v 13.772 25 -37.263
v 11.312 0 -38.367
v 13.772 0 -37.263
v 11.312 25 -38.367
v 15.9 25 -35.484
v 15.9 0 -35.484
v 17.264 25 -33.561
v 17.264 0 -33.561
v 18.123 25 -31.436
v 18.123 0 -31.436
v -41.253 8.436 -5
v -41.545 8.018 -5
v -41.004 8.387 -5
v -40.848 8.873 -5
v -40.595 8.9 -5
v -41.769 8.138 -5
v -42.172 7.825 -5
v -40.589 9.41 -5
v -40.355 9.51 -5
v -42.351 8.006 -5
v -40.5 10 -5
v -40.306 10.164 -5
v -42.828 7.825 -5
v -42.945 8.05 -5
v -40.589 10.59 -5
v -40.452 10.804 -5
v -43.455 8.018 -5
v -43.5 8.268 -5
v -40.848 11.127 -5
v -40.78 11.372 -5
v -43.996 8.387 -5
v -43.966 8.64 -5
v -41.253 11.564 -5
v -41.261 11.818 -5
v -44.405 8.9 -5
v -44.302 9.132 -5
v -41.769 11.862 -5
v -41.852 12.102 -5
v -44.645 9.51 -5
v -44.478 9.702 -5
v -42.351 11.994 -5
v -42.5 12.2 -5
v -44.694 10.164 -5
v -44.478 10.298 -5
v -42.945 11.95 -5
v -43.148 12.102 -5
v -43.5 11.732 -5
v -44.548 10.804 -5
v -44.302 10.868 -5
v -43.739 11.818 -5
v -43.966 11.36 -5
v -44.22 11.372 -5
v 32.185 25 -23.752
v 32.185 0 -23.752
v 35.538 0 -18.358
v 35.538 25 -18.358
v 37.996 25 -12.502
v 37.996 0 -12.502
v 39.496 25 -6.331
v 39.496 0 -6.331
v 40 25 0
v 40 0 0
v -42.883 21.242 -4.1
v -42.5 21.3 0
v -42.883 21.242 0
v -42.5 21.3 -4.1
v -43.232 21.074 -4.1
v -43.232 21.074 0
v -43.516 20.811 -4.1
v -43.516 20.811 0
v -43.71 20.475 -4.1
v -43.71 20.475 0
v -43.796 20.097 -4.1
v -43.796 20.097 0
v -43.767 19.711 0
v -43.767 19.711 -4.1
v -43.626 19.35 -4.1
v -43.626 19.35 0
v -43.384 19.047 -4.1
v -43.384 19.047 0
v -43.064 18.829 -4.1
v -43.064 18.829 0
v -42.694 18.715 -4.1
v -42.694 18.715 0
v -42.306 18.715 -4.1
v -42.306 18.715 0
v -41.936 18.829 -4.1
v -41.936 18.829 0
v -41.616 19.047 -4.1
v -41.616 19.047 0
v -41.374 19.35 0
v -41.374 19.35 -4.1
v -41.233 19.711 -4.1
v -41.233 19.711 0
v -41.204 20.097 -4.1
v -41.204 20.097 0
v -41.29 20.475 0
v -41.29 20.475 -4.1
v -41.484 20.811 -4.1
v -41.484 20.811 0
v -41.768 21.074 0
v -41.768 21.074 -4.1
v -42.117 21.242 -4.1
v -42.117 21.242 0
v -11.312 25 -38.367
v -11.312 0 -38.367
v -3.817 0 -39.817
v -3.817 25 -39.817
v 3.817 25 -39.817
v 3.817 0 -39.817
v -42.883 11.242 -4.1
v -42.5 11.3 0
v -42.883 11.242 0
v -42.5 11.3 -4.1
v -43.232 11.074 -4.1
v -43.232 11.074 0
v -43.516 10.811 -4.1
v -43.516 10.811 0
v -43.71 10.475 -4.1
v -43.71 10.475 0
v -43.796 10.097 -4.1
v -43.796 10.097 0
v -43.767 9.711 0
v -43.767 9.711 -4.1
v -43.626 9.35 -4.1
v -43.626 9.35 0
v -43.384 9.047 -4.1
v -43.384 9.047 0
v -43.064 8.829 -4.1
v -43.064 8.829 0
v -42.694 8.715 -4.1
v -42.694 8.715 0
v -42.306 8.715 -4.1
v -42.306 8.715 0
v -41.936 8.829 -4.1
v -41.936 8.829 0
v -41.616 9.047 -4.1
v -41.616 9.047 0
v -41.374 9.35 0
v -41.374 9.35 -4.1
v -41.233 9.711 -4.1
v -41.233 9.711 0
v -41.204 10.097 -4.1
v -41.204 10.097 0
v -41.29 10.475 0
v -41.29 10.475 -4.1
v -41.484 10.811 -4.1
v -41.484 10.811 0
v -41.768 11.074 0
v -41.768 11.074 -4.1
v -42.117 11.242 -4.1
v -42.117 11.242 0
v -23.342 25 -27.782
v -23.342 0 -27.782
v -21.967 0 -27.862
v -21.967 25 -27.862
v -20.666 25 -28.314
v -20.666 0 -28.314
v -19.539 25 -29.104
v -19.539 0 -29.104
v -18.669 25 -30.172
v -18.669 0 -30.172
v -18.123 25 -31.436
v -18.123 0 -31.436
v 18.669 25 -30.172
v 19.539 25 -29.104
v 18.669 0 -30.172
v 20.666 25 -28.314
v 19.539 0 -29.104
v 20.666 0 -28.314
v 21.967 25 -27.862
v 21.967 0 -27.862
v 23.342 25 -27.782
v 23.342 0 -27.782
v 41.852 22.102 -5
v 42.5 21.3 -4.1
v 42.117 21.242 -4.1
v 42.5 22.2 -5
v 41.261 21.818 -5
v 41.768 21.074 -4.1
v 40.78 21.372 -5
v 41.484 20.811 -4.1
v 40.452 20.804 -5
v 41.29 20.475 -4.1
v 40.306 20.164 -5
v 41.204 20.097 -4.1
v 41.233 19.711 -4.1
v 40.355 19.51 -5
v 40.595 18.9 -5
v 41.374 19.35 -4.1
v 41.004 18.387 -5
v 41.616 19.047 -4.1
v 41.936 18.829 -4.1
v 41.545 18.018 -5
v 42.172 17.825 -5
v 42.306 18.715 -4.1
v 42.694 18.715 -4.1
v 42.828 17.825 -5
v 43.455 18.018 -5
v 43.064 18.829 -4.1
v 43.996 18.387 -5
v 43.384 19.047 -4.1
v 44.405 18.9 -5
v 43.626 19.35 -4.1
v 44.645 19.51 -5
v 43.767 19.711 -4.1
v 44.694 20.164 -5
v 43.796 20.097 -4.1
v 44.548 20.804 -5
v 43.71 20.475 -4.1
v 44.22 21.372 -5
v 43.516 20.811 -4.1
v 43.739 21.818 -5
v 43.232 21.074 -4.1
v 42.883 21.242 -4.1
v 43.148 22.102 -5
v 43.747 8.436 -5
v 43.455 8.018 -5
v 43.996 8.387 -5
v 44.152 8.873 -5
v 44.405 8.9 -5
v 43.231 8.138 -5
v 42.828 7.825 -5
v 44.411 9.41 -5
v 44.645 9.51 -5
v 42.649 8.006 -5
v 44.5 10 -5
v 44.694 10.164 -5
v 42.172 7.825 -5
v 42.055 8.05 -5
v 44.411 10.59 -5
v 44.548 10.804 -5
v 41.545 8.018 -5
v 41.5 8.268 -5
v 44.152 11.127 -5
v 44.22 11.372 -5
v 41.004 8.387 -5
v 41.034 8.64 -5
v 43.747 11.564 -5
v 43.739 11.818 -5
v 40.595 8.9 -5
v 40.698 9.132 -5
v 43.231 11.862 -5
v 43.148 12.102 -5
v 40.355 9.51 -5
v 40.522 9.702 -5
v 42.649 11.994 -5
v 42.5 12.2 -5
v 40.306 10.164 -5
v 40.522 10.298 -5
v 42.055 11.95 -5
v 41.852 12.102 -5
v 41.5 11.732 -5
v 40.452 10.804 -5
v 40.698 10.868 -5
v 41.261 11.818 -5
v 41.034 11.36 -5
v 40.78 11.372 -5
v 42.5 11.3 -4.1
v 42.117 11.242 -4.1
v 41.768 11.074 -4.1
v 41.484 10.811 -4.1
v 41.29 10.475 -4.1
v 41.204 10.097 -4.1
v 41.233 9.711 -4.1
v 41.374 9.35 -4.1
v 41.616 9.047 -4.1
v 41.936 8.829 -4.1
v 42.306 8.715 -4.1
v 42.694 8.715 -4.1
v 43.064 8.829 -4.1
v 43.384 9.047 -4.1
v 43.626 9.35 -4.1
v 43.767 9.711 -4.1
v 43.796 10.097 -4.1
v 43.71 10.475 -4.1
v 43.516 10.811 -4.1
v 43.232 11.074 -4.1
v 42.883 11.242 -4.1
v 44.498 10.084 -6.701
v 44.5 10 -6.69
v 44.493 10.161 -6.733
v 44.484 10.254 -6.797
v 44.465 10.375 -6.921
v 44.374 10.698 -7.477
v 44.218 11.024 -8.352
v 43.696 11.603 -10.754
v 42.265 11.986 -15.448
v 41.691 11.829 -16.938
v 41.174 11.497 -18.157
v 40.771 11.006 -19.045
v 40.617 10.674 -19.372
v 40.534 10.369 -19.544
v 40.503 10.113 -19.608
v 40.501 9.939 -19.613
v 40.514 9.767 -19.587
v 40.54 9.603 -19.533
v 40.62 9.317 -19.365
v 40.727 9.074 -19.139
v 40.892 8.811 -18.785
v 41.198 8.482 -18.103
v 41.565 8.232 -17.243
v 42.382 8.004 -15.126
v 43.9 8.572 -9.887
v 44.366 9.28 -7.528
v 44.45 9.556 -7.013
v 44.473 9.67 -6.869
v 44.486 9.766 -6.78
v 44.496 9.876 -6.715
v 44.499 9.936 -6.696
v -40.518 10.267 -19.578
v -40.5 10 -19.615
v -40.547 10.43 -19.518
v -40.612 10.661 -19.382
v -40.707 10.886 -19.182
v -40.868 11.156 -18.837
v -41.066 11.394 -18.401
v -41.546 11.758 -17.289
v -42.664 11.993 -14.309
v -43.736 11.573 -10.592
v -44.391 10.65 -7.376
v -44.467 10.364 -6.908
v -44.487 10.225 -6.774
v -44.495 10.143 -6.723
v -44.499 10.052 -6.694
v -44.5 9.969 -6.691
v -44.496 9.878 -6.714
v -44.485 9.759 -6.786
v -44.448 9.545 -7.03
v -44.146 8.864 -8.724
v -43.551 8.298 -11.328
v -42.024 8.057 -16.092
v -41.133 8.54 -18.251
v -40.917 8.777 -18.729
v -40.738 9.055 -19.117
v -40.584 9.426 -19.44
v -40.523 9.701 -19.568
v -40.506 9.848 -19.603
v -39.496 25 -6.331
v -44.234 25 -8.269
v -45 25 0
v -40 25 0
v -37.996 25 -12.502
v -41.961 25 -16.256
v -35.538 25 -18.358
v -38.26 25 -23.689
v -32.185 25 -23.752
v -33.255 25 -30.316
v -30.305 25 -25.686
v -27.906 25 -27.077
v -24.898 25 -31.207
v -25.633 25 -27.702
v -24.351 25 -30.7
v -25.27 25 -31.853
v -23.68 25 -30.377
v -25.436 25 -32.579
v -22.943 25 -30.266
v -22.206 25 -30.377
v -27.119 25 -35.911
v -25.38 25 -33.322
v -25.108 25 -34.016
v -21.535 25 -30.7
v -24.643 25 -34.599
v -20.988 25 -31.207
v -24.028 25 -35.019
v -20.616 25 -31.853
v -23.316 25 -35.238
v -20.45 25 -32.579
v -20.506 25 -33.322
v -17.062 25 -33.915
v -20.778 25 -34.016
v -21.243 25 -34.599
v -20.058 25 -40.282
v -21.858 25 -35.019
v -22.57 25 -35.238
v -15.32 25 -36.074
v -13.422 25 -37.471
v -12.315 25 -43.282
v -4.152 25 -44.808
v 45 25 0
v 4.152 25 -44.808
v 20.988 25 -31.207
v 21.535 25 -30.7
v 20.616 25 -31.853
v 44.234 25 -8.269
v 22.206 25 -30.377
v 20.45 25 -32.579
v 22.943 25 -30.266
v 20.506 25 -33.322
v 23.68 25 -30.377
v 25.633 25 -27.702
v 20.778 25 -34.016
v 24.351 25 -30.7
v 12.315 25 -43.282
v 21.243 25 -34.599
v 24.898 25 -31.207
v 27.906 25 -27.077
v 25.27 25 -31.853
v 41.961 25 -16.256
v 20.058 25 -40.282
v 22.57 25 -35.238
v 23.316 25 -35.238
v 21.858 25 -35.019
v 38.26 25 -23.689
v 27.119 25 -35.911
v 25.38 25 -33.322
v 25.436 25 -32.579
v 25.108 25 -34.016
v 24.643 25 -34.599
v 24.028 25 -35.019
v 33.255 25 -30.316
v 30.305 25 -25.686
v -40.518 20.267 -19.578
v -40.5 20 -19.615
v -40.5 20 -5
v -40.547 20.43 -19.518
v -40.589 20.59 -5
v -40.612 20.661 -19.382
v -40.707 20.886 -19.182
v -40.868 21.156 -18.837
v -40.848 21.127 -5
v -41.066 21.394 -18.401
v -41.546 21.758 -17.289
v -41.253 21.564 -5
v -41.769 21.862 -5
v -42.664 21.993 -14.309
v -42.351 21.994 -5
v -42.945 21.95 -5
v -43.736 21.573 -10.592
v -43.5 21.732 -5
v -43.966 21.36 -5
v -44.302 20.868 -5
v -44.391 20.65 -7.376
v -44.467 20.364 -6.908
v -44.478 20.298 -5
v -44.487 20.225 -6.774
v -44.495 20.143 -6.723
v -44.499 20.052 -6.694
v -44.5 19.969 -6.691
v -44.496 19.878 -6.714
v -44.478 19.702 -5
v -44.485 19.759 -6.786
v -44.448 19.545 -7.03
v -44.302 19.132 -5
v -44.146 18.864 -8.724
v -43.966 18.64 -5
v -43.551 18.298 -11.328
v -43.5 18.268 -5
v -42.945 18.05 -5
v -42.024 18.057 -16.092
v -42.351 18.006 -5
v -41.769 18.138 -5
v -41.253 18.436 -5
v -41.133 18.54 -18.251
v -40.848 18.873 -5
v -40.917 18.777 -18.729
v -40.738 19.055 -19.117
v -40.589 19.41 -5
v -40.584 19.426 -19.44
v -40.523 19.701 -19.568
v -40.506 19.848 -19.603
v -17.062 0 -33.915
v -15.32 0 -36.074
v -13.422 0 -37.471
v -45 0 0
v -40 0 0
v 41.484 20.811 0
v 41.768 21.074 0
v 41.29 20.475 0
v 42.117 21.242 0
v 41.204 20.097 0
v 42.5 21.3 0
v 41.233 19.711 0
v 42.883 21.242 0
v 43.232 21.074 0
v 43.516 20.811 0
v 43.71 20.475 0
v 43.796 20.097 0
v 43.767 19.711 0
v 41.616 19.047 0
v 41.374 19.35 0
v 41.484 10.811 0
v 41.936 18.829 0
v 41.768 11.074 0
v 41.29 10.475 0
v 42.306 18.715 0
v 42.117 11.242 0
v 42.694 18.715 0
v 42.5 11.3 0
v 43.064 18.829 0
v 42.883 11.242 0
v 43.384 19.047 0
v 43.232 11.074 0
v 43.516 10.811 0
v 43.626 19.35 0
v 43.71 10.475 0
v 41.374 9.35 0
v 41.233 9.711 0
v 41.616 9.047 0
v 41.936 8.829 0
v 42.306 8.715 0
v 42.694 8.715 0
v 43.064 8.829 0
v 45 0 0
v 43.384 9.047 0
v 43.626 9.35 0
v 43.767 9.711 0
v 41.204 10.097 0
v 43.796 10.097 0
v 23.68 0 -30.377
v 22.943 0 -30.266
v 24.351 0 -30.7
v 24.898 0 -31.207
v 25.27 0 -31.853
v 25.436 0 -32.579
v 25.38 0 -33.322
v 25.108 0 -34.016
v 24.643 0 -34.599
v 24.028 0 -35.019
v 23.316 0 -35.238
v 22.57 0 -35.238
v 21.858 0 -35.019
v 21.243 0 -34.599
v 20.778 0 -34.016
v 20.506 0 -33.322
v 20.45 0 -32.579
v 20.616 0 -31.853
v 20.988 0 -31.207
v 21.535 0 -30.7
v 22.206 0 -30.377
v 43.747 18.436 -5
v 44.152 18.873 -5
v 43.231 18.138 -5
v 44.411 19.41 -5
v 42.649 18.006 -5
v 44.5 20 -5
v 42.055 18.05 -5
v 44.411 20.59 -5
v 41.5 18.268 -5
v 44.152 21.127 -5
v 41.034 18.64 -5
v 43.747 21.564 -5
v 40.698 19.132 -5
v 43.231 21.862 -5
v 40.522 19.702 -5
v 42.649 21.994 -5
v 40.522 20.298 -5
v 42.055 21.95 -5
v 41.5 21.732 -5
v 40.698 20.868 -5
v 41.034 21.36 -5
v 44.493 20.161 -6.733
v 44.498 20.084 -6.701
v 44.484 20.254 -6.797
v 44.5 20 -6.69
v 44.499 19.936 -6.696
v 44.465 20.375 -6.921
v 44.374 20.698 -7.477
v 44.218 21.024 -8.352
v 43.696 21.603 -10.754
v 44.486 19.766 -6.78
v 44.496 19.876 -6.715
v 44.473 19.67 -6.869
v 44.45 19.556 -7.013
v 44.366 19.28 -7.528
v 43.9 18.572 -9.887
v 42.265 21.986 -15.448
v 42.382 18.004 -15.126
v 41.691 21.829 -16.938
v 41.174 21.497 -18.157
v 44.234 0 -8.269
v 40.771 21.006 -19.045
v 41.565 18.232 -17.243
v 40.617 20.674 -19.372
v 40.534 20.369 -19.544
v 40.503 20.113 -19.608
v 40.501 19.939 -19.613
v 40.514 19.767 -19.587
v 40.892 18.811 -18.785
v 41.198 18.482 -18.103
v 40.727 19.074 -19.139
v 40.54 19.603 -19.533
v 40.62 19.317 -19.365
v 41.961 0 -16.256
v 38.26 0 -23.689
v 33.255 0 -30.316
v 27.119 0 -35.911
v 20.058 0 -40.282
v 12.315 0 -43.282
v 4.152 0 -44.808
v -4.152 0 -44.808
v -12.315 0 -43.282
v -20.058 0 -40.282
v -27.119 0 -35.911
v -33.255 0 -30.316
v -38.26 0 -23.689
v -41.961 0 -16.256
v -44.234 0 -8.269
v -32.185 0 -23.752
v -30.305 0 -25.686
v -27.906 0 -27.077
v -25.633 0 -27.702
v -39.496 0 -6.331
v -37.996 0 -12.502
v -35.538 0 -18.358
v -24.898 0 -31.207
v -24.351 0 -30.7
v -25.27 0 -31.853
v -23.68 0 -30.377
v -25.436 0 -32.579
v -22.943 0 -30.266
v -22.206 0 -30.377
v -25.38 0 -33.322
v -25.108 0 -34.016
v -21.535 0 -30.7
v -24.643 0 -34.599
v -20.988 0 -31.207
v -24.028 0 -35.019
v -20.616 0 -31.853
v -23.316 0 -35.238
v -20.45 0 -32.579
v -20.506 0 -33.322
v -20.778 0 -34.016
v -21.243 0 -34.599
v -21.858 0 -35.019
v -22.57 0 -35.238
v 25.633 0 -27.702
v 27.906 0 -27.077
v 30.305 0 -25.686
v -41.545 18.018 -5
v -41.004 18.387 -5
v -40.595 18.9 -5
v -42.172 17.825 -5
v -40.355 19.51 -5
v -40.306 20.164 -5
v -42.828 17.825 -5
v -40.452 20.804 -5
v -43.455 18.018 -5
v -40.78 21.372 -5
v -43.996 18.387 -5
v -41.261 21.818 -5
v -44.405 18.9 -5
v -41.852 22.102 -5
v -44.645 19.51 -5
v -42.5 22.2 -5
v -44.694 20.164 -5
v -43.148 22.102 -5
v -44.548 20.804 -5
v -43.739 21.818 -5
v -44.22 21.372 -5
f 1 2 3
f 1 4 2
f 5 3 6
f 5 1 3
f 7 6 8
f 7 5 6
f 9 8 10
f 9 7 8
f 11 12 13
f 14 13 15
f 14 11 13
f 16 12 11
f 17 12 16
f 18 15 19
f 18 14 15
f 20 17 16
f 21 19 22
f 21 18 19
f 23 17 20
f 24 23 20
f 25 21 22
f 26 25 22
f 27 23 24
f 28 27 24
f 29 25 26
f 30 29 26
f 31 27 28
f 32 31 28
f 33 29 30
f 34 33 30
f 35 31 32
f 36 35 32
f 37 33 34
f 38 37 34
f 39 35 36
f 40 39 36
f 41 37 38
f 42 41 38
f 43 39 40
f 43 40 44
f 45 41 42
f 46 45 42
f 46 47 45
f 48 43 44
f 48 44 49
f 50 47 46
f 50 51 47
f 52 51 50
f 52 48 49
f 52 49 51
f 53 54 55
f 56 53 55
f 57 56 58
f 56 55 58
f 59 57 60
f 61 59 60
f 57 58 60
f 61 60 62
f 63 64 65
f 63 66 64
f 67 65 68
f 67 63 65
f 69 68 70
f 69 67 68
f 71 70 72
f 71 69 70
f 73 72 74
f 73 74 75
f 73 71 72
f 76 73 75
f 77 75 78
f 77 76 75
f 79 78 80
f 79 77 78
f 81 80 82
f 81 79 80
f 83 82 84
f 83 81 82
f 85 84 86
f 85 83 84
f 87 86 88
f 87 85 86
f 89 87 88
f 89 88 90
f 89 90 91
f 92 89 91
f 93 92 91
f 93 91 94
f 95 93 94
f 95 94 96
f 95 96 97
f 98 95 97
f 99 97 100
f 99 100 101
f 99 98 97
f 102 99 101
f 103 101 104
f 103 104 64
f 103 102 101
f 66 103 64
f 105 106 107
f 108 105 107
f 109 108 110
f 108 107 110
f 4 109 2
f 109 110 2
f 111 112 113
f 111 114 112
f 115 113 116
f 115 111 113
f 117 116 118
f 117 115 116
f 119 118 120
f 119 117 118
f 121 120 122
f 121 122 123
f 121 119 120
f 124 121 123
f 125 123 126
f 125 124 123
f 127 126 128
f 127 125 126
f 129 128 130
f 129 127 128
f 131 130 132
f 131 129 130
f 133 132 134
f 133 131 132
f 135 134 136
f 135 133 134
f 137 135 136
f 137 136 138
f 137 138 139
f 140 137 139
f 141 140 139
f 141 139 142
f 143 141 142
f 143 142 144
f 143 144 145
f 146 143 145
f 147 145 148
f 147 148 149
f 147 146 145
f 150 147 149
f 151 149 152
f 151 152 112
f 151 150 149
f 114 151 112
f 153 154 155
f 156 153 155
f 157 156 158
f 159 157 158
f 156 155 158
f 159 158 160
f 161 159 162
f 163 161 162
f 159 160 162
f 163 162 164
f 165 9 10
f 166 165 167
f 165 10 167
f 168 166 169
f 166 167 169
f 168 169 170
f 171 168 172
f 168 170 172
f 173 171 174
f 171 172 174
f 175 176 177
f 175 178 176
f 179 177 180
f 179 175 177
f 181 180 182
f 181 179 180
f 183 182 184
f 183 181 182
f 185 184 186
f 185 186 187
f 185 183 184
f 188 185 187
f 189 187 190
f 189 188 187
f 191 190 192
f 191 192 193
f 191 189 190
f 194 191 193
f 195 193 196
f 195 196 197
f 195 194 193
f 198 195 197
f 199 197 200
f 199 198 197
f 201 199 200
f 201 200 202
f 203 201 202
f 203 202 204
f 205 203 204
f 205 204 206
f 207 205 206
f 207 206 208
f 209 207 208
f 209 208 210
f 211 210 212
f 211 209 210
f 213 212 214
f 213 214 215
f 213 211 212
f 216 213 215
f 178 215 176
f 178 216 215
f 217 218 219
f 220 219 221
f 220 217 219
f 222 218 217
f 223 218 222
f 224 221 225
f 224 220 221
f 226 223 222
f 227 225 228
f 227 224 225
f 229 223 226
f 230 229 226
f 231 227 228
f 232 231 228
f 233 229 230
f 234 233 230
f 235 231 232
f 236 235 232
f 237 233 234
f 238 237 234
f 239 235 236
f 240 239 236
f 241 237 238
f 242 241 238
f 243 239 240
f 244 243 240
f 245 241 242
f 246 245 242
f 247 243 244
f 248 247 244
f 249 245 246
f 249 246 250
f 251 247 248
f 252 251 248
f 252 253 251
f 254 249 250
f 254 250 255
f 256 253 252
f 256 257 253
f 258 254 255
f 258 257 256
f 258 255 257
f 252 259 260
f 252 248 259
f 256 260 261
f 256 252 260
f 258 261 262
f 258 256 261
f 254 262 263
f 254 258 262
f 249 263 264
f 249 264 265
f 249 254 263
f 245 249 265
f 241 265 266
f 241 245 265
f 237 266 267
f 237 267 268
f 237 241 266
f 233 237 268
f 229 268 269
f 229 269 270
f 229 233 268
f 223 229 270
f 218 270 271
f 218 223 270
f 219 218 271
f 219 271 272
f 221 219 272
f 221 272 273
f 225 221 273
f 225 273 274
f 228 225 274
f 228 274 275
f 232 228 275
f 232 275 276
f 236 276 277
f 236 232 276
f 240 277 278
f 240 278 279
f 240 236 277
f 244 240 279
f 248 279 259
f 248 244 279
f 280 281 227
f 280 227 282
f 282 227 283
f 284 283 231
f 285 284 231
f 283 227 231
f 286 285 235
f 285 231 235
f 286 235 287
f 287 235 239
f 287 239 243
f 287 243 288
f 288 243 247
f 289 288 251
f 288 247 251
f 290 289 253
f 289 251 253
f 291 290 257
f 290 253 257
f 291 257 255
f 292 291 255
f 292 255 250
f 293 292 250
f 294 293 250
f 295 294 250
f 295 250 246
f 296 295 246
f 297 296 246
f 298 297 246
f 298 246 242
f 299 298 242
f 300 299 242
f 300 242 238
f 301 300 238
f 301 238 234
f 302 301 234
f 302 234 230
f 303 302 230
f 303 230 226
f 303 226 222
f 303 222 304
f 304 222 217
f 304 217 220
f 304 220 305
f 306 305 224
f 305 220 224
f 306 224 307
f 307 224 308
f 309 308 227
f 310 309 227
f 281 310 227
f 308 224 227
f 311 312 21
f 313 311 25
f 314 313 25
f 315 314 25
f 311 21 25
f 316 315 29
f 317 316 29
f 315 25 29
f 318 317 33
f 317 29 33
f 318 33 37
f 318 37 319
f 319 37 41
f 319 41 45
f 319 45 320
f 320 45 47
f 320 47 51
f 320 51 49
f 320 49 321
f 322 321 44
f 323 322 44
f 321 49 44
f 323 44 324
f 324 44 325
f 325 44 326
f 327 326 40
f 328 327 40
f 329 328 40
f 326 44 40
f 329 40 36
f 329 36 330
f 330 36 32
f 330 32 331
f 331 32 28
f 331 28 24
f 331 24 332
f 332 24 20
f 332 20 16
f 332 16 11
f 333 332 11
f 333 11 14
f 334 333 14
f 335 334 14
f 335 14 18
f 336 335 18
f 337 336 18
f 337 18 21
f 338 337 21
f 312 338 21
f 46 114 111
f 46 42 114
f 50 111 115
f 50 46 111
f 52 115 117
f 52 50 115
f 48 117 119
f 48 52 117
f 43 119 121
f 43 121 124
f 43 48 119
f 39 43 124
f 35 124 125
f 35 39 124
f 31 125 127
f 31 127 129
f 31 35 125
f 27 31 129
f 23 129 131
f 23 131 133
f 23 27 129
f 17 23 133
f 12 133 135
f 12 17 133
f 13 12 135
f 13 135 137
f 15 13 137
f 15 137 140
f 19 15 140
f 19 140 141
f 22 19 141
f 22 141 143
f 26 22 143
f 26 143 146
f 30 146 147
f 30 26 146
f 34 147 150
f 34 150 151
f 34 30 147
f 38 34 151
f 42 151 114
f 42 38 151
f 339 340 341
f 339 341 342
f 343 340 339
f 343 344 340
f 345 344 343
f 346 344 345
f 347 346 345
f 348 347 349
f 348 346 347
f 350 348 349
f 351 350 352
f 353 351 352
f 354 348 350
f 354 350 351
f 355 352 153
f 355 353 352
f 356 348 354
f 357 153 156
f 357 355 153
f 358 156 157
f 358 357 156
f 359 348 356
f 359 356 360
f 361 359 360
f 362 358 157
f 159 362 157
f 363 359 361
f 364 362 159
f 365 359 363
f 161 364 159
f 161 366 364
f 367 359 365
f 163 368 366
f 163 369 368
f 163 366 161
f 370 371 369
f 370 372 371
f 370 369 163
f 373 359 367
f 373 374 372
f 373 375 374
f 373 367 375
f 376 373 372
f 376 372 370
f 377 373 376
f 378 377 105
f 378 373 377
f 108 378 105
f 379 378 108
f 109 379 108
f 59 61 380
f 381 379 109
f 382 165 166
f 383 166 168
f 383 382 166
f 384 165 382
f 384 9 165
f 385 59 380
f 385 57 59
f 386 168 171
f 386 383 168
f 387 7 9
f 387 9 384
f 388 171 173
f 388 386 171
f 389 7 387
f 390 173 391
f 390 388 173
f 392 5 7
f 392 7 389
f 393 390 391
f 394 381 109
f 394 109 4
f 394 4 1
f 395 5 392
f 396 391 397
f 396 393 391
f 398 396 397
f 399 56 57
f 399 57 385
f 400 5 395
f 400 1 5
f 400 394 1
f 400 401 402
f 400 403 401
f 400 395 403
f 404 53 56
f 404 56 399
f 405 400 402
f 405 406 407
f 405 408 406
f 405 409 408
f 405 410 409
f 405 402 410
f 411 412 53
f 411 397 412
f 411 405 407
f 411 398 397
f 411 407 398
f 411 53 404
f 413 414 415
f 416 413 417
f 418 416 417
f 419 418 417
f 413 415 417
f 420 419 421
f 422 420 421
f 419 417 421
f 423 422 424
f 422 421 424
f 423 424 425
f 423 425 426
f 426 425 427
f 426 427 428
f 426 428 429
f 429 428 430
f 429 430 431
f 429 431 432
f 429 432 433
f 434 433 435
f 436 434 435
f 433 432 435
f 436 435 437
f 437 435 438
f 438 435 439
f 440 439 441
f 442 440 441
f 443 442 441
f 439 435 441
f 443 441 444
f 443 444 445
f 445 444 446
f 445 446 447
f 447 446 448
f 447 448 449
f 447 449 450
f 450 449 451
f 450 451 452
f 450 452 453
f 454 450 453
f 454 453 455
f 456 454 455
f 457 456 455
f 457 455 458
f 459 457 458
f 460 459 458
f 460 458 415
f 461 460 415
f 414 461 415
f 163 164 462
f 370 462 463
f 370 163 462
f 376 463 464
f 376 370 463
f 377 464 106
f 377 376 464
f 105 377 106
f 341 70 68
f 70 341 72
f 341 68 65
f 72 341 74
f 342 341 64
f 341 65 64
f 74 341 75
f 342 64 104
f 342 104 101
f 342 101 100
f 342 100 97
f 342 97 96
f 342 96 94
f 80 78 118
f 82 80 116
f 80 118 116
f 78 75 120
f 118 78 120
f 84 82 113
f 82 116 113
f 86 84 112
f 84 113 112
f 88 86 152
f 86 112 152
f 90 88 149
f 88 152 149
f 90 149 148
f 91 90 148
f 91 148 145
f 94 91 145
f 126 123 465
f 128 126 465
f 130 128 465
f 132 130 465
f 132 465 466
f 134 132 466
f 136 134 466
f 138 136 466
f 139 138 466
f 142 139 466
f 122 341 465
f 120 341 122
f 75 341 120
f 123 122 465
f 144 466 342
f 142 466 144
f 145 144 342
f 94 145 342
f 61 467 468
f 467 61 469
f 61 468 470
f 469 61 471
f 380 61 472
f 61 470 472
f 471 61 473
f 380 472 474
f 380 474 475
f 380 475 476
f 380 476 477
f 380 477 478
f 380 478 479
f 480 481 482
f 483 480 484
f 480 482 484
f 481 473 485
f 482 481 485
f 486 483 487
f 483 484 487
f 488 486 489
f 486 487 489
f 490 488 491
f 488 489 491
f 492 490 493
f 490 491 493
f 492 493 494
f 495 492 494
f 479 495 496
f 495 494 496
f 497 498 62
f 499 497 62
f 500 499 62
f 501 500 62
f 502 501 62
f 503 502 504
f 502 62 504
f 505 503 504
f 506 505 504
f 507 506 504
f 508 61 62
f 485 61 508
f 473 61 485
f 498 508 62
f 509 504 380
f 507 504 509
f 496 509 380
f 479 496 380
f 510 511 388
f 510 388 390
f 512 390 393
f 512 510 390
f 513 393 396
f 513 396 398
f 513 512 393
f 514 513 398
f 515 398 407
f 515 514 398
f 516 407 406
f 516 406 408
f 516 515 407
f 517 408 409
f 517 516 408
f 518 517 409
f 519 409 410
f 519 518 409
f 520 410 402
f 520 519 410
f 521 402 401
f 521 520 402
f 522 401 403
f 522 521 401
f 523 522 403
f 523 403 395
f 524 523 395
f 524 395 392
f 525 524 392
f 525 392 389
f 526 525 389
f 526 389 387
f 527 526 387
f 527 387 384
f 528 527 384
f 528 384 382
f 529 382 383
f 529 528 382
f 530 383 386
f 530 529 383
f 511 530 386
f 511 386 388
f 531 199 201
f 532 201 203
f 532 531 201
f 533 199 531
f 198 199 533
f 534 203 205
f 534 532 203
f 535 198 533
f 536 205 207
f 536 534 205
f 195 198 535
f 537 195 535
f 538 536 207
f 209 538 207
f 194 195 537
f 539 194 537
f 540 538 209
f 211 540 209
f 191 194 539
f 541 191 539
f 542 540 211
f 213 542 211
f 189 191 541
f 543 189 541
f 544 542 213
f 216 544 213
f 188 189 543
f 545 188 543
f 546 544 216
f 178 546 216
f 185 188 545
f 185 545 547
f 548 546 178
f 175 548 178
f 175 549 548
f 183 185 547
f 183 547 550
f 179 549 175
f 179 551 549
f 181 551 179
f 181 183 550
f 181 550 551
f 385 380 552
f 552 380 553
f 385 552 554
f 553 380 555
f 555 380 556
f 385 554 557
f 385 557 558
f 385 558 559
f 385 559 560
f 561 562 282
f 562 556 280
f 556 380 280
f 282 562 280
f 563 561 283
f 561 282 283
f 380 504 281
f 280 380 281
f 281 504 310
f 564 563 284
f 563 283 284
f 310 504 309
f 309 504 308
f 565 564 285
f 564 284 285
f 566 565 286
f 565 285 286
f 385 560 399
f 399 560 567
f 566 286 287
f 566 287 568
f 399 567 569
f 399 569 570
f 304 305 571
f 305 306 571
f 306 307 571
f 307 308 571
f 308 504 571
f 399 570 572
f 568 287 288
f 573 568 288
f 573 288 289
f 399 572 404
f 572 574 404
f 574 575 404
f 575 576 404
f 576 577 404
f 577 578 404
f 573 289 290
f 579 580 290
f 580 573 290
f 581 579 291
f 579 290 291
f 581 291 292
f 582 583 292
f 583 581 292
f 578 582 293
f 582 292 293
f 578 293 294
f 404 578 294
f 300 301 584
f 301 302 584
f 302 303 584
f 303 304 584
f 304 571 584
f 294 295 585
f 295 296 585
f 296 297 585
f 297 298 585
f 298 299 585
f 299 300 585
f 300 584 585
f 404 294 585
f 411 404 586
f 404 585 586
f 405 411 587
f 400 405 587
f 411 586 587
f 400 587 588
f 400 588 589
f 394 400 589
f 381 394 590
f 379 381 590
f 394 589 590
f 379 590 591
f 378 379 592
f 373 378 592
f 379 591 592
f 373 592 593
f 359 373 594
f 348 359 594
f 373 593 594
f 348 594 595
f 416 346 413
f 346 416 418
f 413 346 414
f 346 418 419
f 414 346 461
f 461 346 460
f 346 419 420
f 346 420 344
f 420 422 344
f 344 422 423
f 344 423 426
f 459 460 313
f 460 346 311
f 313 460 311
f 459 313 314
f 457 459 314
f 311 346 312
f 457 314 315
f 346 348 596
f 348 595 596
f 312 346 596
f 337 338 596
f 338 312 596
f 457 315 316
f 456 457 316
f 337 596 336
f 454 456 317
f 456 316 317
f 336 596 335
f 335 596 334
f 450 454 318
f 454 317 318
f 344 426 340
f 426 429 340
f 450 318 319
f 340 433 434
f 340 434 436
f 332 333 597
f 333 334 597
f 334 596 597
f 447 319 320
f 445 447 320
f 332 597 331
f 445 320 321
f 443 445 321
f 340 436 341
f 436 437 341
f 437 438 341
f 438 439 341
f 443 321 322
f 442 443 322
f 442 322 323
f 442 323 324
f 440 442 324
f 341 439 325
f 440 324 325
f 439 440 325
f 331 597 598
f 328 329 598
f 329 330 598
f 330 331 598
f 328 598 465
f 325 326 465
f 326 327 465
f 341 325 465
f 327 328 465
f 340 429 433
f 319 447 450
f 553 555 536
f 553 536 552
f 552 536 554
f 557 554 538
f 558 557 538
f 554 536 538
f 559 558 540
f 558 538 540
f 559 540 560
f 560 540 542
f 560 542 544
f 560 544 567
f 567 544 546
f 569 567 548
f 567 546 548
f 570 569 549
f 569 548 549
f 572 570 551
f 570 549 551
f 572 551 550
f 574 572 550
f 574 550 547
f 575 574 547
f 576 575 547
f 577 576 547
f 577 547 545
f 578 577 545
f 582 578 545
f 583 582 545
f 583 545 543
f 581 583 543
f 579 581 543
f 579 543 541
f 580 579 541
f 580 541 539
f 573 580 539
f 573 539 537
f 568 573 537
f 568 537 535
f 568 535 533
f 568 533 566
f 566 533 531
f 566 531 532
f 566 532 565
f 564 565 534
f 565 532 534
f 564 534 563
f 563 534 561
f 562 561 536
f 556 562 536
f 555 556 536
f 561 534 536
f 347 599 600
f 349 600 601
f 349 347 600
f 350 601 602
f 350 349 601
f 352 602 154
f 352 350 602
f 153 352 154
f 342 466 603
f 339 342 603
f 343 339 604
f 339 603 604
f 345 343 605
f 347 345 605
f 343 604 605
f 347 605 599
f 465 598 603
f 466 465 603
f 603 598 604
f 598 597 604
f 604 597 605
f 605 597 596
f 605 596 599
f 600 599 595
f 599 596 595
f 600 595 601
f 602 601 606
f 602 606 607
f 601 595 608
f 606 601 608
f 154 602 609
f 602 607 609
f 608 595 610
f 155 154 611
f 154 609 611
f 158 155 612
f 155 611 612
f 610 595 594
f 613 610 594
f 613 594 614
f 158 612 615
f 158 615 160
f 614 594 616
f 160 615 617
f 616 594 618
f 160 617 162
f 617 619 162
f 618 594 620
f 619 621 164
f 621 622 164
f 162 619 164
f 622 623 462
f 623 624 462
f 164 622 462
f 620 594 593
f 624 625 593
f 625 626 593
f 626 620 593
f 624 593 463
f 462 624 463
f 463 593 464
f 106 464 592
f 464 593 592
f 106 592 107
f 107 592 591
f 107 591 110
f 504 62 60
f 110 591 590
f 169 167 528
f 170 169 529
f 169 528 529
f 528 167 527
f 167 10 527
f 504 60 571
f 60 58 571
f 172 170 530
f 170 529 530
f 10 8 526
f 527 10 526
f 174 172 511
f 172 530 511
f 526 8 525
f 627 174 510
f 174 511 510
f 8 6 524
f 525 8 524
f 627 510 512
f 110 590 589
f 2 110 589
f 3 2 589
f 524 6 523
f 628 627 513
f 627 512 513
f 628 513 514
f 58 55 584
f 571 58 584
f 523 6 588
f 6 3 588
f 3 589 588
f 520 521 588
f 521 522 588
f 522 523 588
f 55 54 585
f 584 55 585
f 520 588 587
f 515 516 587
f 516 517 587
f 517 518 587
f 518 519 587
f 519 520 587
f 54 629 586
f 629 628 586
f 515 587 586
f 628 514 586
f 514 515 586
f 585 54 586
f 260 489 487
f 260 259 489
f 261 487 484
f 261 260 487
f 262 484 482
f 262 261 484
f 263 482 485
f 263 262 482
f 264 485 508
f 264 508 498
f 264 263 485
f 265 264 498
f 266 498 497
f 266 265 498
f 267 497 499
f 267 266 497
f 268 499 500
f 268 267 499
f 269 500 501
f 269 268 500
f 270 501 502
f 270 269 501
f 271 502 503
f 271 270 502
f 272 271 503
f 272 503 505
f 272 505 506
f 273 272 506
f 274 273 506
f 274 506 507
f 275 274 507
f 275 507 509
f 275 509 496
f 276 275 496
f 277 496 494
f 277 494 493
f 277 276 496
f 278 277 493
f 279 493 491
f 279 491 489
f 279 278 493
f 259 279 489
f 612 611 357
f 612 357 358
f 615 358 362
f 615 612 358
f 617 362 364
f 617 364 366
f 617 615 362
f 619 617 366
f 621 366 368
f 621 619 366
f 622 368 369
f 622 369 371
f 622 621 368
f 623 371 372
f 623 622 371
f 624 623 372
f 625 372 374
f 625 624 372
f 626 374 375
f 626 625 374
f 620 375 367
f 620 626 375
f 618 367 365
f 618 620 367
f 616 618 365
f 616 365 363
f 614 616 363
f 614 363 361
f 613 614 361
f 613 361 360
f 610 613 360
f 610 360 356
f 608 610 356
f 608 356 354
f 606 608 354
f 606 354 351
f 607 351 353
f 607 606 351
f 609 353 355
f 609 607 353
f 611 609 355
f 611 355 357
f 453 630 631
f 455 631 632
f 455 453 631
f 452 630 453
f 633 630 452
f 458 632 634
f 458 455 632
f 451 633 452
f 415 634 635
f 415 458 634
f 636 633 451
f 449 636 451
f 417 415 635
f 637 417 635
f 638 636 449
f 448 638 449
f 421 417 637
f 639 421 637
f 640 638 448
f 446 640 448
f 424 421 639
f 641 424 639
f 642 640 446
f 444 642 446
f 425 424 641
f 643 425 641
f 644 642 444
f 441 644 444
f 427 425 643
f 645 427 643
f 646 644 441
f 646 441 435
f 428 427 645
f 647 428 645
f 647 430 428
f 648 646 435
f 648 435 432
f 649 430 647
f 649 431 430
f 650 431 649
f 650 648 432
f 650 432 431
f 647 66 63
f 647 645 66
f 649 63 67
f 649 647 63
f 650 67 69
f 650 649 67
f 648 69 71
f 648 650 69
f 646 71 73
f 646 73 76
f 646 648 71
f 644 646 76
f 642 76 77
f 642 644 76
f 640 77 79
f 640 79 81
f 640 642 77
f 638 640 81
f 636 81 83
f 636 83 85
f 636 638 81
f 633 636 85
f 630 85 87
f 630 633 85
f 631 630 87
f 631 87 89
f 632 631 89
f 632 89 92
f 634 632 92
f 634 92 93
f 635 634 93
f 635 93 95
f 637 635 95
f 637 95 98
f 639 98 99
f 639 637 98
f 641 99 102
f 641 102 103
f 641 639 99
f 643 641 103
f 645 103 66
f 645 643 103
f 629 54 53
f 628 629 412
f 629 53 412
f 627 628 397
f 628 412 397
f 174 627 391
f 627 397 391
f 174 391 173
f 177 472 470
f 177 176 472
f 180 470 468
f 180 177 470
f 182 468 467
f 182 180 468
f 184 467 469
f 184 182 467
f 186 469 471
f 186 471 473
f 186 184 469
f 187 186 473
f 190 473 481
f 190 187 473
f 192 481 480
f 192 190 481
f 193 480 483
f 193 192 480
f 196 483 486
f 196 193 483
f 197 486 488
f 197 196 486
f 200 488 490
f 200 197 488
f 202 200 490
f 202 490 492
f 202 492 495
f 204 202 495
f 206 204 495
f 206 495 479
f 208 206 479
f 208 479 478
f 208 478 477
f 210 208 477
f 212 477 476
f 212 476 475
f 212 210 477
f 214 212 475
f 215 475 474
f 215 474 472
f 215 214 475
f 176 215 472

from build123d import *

# Parameters (mm, degrees)
SKETCH1_R                                      = 2.5
BOSS_EXTRUDE1_DEPTH                            = 25
CUT_EXTRUDE3_START                             = -5
SKETCH6_R                                      = 2
CUT_EXTRUDE3_DEPTH                             = 64.373971656
SKETCH7_R                                      = 1
CUT_EXTRUDE4_DEPTH                             = 69.373971824
FILLET1_R                                      = 10
CSK_FOR_M2_FLAT_HEAD_MACHINE_SCREW1_AT_2_COUNT = 2
CSK_FOR_M2_FLAT_HEAD_MACHINE_SCREW1_AT_2_PITCH = 85.586213843
CSK_FOR_M2_FLAT_HEAD_MACHINE_SCREW2_AT_2_COUNT = 2
CSK_FOR_M2_FLAT_HEAD_MACHINE_SCREW2_AT_2_PITCH = 85.586213843


with BuildPart() as part:
    # Sketch1 → Boss-Extrude1 (new body)
    with BuildSketch(Plane(origin=(0, 0, 0), x_dir=(1, 0, 0), z_dir=(0, 1, 0))):
        with BuildLine():
            Line((-45, 0), (-40, 0))
            ThreePointArc((-40, 0), (-36.565439333, 16.216308038), (-26.85156768, 29.647821389))
            ThreePointArc((-26.85156768, 29.647821389), (-20.075175272, 28.67032155), (-18.676061955, 35.372372126))
            ThreePointArc((-18.676061955, 35.372372126), (0, 40), (18.676061955, 35.372372126))
            ThreePointArc((18.676061955, 35.372372126), (20.075175272, 28.67032155), (26.85156768, 29.647821389))
            ThreePointArc((26.85156768, 29.647821389), (36.565439333, 16.216308038), (40, 0))
            Line((40, 0), (45, 0))
            ThreePointArc((45, 0), (0, 45), (-45, 0))
        make_face()
        with Locations(Location((22.943057454, 32.766081772, 0), (0, 0, 270))):
            Circle(SKETCH1_R, mode=Mode.SUBTRACT)
        with Locations(Location((-22.943057454, 32.766081772, 0), (0, 0, 270))):
            Circle(SKETCH1_R, mode=Mode.SUBTRACT)
    extrude(amount=BOSS_EXTRUDE1_DEPTH)

    # Sketch6 → Cut-Extrude3 (cut, through all)
    with BuildSketch(Plane.XY.offset(CUT_EXTRUDE3_START)):
        with Locations((-42.5, 20)):
            Circle(SKETCH6_R)
        with Locations((-42.5, 10)):
            Circle(SKETCH6_R)
        with Locations((42.5, 20)):
            Circle(SKETCH6_R)
        with Locations((42.5, 10)):
            Circle(SKETCH6_R)
    extrude(amount=-CUT_EXTRUDE3_DEPTH, mode=Mode.SUBTRACT)

    # Sketch7 → Cut-Extrude4 (cut, through all)
    with BuildSketch(Plane.XY):
        with Locations((-42.5, 20)):
            Circle(SKETCH7_R)
        with Locations((-42.5, 10)):
            Circle(SKETCH7_R)
        with Locations((42.5, 10)):
            Circle(SKETCH7_R)
        with Locations((42.5, 20)):
            Circle(SKETCH7_R)
    extrude(amount=-CUT_EXTRUDE4_DEPTH, mode=Mode.SUBTRACT)

    # Fillet1
    fillet1_edges = [part.edges().sort_by_distance(p)[0] for p in [
        (26.85156768, 12.5, -29.647821389),
        (18.676061955, 12.5, -35.372372126),
        (-18.676061955, 12.5, -35.372372126),
        (-26.85156768, 12.5, -29.647821389),
    ]]
    fillet(fillet1_edges, radius=FILLET1_R)

    # Sketch17 → CSK for M2 Flat Head Machine Screw1 (revolve, cut)
    with BuildSketch(Plane(origin=(-42.5, 20, -5), x_dir=(0, 1, 0), z_dir=(1, 0, 0))):
        Polygon((0, 0), (0, 5), (1.3, 5), (1.3, 0.9), (2.2, 0), align=None)
    csk_for_m2_flat_head_machine_screw1 = revolve(axis=Axis((-42.5, 20, -11.35), (0, 0, 1)), mode=Mode.SUBTRACT)

    # CSK for M2 Flat Head Machine Screw1 at 2: CSK for M2 Flat Head Machine Screw1 ×2
    with Locations(*[Vector(0.9931506043228763, -0.11684124756739721, 0) * (i * CSK_FOR_M2_FLAT_HEAD_MACHINE_SCREW1_AT_2_PITCH) for i in range(1, CSK_FOR_M2_FLAT_HEAD_MACHINE_SCREW1_AT_2_COUNT)]):
        add(csk_for_m2_flat_head_machine_screw1, mode=Mode.SUBTRACT)

    # Sketch18 → CSK for M2 Flat Head Machine Screw2 (revolve, cut)
    with BuildSketch(Plane(origin=(42.5, 20, -5), x_dir=(0, 1, 0), z_dir=(1, 0, 0))):
        Polygon((0, 0), (0, 5), (1.3, 5), (1.3, 0.9), (2.2, 0), align=None)
    csk_for_m2_flat_head_machine_screw2 = revolve(axis=Axis((42.5, 20, -11.35), (0, 0, 1)), mode=Mode.SUBTRACT)

    # CSK for M2 Flat Head Machine Screw2 at 2: CSK for M2 Flat Head Machine Screw2 ×2
    with Locations(*[Vector(-0.9931506043228763, -0.11684124756739721, 0) * (i * CSK_FOR_M2_FLAT_HEAD_MACHINE_SCREW2_AT_2_PITCH) for i in range(1, CSK_FOR_M2_FLAT_HEAD_MACHINE_SCREW2_AT_2_COUNT)]):
        add(csk_for_m2_flat_head_machine_screw2, mode=Mode.SUBTRACT)


solid = part.part
